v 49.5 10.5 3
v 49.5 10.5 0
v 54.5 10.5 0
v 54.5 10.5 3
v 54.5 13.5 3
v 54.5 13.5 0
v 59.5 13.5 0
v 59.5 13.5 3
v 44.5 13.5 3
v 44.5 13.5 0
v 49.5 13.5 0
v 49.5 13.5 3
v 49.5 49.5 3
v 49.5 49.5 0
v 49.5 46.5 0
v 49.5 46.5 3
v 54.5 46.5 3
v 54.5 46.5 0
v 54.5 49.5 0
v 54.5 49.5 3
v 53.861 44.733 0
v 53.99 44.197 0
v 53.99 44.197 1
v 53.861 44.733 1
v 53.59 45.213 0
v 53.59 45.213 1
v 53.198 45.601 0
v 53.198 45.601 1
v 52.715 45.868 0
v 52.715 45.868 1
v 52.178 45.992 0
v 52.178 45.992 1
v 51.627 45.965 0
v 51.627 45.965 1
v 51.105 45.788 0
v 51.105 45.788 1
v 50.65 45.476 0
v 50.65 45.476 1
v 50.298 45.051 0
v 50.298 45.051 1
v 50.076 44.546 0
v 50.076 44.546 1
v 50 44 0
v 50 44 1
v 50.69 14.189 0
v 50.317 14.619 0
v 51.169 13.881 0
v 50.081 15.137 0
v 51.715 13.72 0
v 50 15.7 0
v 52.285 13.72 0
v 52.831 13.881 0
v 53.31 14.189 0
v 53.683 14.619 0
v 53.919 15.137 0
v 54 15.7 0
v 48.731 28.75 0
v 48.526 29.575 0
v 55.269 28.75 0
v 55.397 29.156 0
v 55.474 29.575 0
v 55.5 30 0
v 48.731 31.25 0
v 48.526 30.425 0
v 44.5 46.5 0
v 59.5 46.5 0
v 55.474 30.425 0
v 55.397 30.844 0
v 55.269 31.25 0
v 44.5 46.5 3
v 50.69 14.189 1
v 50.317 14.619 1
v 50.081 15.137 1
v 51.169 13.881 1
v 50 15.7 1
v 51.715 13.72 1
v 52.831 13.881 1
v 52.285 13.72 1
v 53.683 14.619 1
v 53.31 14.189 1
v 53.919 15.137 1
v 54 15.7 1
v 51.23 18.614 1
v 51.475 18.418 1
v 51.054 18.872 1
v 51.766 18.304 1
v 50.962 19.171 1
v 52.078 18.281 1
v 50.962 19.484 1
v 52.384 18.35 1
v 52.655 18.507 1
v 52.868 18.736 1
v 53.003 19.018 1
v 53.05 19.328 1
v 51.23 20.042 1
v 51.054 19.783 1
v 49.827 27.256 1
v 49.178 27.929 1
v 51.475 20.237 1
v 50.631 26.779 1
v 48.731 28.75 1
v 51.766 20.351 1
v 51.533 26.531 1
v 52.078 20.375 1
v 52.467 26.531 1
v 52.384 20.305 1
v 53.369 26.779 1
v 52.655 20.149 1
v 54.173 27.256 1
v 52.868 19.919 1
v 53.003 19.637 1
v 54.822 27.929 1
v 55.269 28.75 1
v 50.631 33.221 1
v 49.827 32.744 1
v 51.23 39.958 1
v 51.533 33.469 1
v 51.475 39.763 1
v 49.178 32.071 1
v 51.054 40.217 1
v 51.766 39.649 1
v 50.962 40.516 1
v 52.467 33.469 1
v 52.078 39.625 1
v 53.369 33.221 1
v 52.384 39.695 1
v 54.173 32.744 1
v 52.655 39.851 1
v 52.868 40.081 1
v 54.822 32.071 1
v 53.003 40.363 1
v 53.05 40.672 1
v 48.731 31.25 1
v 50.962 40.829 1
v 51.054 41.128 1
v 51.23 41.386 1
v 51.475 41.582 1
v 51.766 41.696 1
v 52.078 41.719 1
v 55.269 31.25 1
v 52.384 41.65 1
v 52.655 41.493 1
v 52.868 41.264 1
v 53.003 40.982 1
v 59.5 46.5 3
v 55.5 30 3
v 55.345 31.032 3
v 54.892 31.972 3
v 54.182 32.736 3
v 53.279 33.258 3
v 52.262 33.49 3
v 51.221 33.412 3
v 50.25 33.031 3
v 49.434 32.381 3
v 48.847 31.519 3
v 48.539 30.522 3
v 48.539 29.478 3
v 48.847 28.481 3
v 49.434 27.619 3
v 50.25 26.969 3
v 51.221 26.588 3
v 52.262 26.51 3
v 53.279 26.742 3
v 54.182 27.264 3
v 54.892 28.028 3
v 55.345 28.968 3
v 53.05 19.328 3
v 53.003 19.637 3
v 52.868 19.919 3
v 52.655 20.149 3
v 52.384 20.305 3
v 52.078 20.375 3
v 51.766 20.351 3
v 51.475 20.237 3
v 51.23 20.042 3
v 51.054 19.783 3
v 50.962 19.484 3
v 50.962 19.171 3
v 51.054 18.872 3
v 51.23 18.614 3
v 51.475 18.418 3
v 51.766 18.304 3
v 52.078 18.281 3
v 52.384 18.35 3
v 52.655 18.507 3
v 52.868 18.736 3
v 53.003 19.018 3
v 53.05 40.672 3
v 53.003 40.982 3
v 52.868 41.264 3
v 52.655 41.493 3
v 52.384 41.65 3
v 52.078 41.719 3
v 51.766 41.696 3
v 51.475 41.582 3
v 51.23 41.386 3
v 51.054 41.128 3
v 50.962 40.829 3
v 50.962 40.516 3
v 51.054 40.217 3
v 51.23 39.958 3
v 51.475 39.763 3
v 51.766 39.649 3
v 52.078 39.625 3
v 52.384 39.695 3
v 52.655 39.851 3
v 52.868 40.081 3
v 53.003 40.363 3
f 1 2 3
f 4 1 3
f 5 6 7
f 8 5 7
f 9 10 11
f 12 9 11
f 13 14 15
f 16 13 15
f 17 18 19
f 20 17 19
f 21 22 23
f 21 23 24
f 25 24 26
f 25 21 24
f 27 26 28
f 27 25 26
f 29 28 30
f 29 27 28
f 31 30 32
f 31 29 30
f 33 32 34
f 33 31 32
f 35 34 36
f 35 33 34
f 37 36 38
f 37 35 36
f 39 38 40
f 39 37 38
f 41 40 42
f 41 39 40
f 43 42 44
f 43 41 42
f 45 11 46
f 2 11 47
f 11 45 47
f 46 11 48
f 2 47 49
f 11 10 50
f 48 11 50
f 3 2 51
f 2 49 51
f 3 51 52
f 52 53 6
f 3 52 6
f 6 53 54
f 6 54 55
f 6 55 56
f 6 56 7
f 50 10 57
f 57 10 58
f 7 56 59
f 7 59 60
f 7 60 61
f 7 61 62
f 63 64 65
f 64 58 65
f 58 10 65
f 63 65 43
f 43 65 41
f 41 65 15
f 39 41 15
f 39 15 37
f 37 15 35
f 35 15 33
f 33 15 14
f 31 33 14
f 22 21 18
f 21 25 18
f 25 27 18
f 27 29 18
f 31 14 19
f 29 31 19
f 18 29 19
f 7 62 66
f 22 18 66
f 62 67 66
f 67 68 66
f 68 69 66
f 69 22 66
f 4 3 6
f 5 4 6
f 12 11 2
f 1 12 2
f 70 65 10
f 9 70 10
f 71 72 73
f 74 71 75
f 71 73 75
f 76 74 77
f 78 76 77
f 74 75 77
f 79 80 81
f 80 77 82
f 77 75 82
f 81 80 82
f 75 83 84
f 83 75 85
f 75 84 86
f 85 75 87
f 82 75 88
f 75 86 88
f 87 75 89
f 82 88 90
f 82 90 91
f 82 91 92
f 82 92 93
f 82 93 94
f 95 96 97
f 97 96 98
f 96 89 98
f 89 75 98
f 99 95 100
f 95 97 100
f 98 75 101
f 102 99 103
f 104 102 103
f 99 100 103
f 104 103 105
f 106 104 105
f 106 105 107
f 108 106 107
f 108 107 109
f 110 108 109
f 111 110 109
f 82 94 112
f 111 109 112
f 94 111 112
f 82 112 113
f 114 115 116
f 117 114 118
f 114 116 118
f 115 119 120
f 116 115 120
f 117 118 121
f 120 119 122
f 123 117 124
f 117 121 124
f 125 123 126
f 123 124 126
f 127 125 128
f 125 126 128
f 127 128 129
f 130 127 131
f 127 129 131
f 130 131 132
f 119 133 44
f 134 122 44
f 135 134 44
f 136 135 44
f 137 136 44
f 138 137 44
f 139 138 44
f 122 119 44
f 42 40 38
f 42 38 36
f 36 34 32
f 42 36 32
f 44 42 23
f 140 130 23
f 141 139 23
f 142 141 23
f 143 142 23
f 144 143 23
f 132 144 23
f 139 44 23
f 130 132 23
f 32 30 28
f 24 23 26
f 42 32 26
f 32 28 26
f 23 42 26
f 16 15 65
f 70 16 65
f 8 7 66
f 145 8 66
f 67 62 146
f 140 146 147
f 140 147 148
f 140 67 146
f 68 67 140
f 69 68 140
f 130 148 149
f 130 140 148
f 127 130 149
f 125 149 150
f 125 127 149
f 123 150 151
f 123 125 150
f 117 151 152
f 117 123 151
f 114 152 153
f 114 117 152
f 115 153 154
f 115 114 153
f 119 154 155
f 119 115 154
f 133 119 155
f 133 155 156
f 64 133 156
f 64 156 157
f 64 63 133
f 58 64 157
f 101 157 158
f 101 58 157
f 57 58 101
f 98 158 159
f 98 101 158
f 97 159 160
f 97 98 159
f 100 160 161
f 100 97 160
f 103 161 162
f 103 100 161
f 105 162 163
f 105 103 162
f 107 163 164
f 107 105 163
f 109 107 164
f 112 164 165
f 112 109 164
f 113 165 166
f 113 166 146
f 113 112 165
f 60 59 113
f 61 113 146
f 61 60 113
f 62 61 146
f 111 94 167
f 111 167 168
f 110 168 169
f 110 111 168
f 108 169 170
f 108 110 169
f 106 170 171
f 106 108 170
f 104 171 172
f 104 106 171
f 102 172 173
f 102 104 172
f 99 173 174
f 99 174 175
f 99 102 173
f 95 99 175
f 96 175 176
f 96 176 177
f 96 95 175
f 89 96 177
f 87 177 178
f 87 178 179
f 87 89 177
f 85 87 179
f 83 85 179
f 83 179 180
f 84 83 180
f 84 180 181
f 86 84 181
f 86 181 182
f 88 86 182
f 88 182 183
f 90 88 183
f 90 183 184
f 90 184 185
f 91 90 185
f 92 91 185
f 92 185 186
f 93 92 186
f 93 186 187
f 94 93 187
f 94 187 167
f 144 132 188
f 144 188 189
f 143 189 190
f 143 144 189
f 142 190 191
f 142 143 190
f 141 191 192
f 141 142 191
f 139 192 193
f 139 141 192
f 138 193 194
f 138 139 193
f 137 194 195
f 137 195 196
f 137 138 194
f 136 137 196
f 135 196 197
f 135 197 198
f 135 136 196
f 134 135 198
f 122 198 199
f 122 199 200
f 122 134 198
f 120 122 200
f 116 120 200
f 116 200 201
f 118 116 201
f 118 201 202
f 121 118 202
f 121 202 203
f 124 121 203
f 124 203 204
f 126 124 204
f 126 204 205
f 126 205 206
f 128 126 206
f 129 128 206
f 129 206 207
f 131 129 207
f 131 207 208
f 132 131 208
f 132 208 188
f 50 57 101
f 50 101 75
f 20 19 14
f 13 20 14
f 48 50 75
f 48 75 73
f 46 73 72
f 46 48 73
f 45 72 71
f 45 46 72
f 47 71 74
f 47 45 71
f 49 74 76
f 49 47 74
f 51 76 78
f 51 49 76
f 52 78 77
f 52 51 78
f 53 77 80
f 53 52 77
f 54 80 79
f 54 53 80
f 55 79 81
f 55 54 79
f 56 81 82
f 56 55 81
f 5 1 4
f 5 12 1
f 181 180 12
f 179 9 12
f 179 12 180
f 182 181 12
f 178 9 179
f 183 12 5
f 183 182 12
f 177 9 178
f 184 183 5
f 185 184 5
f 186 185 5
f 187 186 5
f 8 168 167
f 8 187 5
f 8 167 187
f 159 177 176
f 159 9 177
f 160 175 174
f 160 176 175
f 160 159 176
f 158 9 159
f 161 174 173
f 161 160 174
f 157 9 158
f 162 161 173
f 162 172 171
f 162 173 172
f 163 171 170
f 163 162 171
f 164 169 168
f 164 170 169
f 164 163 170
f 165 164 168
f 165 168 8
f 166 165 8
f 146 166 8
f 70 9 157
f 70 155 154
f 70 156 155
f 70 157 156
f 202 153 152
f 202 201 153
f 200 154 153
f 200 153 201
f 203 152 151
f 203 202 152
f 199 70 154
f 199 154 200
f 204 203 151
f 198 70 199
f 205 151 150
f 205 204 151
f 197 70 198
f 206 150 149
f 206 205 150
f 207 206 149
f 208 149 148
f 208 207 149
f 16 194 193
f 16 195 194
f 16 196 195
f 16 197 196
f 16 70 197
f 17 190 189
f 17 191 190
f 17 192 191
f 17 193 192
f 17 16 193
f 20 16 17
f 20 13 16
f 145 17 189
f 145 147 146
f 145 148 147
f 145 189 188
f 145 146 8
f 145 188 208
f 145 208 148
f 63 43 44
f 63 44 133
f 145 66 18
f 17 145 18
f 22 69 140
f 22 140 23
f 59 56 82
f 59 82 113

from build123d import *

# Parameters (mm, degrees)
CORTE_EXTERIOR_R        = 1.05
CORTE_EXTERIOR_R_2      = 3.5
SALIENTE_EXTRUIR1_DEPTH = 3
CORTAR_EXTRUIR1_DEPTH   = 1


with BuildPart() as part:
    # Corte exterior → Saliente-Extruir1 (new body)
    with BuildSketch(Plane.XY):
        Polygon((49.5, 10.5), (54.5, 10.5), (54.5, 13.5), (59.5, 13.5), (59.5, 29.5), (59.5, 46.5), (54.5, 46.5), (54.5, 49.5), (49.5, 49.5), (49.5, 46.5), (44.5, 46.5), (44.5, 23.5), (44.5, 13.5), (49.5, 13.5), align=None)
        with Locations((52, 40.672229454)):
            Circle(CORTE_EXTERIOR_R, mode=Mode.SUBTRACT)
        with Locations((52, 19.327770547)):
            Circle(CORTE_EXTERIOR_R, mode=Mode.SUBTRACT)
        with Locations((52, 30)):
            Circle(CORTE_EXTERIOR_R_2, mode=Mode.SUBTRACT)
    extrude(amount=SALIENTE_EXTRUIR1_DEPTH)

    # Grabado Superficie → Cortar-Extruir1 (cut)
    with BuildSketch(Plane.XY):
        with BuildLine():
            Line((48.730825792, 28.75), (50, 15.7))
            ThreePointArc((50, 15.7), (52, 13.7), (54, 15.7))
            Line((54, 15.7), (55.269174208, 28.75))
            ThreePointArc((55.269174208, 28.75), (52, 26.5), (48.730825792, 28.75))
        make_face()
        with BuildLine():
            Line((55.269174208, 31.25), (53.990313411, 44.196602453))
            ThreePointArc((53.990313411, 44.196602453), (51.901579532, 45.997576885), (50, 44))
            Line((50, 44), (48.730825792, 31.25))
            ThreePointArc((48.730825792, 31.25), (52, 33.5), (55.269174208, 31.25))
        make_face()
    extrude(amount=CORTAR_EXTRUIR1_DEPTH, mode=Mode.SUBTRACT)


solid = part.part
